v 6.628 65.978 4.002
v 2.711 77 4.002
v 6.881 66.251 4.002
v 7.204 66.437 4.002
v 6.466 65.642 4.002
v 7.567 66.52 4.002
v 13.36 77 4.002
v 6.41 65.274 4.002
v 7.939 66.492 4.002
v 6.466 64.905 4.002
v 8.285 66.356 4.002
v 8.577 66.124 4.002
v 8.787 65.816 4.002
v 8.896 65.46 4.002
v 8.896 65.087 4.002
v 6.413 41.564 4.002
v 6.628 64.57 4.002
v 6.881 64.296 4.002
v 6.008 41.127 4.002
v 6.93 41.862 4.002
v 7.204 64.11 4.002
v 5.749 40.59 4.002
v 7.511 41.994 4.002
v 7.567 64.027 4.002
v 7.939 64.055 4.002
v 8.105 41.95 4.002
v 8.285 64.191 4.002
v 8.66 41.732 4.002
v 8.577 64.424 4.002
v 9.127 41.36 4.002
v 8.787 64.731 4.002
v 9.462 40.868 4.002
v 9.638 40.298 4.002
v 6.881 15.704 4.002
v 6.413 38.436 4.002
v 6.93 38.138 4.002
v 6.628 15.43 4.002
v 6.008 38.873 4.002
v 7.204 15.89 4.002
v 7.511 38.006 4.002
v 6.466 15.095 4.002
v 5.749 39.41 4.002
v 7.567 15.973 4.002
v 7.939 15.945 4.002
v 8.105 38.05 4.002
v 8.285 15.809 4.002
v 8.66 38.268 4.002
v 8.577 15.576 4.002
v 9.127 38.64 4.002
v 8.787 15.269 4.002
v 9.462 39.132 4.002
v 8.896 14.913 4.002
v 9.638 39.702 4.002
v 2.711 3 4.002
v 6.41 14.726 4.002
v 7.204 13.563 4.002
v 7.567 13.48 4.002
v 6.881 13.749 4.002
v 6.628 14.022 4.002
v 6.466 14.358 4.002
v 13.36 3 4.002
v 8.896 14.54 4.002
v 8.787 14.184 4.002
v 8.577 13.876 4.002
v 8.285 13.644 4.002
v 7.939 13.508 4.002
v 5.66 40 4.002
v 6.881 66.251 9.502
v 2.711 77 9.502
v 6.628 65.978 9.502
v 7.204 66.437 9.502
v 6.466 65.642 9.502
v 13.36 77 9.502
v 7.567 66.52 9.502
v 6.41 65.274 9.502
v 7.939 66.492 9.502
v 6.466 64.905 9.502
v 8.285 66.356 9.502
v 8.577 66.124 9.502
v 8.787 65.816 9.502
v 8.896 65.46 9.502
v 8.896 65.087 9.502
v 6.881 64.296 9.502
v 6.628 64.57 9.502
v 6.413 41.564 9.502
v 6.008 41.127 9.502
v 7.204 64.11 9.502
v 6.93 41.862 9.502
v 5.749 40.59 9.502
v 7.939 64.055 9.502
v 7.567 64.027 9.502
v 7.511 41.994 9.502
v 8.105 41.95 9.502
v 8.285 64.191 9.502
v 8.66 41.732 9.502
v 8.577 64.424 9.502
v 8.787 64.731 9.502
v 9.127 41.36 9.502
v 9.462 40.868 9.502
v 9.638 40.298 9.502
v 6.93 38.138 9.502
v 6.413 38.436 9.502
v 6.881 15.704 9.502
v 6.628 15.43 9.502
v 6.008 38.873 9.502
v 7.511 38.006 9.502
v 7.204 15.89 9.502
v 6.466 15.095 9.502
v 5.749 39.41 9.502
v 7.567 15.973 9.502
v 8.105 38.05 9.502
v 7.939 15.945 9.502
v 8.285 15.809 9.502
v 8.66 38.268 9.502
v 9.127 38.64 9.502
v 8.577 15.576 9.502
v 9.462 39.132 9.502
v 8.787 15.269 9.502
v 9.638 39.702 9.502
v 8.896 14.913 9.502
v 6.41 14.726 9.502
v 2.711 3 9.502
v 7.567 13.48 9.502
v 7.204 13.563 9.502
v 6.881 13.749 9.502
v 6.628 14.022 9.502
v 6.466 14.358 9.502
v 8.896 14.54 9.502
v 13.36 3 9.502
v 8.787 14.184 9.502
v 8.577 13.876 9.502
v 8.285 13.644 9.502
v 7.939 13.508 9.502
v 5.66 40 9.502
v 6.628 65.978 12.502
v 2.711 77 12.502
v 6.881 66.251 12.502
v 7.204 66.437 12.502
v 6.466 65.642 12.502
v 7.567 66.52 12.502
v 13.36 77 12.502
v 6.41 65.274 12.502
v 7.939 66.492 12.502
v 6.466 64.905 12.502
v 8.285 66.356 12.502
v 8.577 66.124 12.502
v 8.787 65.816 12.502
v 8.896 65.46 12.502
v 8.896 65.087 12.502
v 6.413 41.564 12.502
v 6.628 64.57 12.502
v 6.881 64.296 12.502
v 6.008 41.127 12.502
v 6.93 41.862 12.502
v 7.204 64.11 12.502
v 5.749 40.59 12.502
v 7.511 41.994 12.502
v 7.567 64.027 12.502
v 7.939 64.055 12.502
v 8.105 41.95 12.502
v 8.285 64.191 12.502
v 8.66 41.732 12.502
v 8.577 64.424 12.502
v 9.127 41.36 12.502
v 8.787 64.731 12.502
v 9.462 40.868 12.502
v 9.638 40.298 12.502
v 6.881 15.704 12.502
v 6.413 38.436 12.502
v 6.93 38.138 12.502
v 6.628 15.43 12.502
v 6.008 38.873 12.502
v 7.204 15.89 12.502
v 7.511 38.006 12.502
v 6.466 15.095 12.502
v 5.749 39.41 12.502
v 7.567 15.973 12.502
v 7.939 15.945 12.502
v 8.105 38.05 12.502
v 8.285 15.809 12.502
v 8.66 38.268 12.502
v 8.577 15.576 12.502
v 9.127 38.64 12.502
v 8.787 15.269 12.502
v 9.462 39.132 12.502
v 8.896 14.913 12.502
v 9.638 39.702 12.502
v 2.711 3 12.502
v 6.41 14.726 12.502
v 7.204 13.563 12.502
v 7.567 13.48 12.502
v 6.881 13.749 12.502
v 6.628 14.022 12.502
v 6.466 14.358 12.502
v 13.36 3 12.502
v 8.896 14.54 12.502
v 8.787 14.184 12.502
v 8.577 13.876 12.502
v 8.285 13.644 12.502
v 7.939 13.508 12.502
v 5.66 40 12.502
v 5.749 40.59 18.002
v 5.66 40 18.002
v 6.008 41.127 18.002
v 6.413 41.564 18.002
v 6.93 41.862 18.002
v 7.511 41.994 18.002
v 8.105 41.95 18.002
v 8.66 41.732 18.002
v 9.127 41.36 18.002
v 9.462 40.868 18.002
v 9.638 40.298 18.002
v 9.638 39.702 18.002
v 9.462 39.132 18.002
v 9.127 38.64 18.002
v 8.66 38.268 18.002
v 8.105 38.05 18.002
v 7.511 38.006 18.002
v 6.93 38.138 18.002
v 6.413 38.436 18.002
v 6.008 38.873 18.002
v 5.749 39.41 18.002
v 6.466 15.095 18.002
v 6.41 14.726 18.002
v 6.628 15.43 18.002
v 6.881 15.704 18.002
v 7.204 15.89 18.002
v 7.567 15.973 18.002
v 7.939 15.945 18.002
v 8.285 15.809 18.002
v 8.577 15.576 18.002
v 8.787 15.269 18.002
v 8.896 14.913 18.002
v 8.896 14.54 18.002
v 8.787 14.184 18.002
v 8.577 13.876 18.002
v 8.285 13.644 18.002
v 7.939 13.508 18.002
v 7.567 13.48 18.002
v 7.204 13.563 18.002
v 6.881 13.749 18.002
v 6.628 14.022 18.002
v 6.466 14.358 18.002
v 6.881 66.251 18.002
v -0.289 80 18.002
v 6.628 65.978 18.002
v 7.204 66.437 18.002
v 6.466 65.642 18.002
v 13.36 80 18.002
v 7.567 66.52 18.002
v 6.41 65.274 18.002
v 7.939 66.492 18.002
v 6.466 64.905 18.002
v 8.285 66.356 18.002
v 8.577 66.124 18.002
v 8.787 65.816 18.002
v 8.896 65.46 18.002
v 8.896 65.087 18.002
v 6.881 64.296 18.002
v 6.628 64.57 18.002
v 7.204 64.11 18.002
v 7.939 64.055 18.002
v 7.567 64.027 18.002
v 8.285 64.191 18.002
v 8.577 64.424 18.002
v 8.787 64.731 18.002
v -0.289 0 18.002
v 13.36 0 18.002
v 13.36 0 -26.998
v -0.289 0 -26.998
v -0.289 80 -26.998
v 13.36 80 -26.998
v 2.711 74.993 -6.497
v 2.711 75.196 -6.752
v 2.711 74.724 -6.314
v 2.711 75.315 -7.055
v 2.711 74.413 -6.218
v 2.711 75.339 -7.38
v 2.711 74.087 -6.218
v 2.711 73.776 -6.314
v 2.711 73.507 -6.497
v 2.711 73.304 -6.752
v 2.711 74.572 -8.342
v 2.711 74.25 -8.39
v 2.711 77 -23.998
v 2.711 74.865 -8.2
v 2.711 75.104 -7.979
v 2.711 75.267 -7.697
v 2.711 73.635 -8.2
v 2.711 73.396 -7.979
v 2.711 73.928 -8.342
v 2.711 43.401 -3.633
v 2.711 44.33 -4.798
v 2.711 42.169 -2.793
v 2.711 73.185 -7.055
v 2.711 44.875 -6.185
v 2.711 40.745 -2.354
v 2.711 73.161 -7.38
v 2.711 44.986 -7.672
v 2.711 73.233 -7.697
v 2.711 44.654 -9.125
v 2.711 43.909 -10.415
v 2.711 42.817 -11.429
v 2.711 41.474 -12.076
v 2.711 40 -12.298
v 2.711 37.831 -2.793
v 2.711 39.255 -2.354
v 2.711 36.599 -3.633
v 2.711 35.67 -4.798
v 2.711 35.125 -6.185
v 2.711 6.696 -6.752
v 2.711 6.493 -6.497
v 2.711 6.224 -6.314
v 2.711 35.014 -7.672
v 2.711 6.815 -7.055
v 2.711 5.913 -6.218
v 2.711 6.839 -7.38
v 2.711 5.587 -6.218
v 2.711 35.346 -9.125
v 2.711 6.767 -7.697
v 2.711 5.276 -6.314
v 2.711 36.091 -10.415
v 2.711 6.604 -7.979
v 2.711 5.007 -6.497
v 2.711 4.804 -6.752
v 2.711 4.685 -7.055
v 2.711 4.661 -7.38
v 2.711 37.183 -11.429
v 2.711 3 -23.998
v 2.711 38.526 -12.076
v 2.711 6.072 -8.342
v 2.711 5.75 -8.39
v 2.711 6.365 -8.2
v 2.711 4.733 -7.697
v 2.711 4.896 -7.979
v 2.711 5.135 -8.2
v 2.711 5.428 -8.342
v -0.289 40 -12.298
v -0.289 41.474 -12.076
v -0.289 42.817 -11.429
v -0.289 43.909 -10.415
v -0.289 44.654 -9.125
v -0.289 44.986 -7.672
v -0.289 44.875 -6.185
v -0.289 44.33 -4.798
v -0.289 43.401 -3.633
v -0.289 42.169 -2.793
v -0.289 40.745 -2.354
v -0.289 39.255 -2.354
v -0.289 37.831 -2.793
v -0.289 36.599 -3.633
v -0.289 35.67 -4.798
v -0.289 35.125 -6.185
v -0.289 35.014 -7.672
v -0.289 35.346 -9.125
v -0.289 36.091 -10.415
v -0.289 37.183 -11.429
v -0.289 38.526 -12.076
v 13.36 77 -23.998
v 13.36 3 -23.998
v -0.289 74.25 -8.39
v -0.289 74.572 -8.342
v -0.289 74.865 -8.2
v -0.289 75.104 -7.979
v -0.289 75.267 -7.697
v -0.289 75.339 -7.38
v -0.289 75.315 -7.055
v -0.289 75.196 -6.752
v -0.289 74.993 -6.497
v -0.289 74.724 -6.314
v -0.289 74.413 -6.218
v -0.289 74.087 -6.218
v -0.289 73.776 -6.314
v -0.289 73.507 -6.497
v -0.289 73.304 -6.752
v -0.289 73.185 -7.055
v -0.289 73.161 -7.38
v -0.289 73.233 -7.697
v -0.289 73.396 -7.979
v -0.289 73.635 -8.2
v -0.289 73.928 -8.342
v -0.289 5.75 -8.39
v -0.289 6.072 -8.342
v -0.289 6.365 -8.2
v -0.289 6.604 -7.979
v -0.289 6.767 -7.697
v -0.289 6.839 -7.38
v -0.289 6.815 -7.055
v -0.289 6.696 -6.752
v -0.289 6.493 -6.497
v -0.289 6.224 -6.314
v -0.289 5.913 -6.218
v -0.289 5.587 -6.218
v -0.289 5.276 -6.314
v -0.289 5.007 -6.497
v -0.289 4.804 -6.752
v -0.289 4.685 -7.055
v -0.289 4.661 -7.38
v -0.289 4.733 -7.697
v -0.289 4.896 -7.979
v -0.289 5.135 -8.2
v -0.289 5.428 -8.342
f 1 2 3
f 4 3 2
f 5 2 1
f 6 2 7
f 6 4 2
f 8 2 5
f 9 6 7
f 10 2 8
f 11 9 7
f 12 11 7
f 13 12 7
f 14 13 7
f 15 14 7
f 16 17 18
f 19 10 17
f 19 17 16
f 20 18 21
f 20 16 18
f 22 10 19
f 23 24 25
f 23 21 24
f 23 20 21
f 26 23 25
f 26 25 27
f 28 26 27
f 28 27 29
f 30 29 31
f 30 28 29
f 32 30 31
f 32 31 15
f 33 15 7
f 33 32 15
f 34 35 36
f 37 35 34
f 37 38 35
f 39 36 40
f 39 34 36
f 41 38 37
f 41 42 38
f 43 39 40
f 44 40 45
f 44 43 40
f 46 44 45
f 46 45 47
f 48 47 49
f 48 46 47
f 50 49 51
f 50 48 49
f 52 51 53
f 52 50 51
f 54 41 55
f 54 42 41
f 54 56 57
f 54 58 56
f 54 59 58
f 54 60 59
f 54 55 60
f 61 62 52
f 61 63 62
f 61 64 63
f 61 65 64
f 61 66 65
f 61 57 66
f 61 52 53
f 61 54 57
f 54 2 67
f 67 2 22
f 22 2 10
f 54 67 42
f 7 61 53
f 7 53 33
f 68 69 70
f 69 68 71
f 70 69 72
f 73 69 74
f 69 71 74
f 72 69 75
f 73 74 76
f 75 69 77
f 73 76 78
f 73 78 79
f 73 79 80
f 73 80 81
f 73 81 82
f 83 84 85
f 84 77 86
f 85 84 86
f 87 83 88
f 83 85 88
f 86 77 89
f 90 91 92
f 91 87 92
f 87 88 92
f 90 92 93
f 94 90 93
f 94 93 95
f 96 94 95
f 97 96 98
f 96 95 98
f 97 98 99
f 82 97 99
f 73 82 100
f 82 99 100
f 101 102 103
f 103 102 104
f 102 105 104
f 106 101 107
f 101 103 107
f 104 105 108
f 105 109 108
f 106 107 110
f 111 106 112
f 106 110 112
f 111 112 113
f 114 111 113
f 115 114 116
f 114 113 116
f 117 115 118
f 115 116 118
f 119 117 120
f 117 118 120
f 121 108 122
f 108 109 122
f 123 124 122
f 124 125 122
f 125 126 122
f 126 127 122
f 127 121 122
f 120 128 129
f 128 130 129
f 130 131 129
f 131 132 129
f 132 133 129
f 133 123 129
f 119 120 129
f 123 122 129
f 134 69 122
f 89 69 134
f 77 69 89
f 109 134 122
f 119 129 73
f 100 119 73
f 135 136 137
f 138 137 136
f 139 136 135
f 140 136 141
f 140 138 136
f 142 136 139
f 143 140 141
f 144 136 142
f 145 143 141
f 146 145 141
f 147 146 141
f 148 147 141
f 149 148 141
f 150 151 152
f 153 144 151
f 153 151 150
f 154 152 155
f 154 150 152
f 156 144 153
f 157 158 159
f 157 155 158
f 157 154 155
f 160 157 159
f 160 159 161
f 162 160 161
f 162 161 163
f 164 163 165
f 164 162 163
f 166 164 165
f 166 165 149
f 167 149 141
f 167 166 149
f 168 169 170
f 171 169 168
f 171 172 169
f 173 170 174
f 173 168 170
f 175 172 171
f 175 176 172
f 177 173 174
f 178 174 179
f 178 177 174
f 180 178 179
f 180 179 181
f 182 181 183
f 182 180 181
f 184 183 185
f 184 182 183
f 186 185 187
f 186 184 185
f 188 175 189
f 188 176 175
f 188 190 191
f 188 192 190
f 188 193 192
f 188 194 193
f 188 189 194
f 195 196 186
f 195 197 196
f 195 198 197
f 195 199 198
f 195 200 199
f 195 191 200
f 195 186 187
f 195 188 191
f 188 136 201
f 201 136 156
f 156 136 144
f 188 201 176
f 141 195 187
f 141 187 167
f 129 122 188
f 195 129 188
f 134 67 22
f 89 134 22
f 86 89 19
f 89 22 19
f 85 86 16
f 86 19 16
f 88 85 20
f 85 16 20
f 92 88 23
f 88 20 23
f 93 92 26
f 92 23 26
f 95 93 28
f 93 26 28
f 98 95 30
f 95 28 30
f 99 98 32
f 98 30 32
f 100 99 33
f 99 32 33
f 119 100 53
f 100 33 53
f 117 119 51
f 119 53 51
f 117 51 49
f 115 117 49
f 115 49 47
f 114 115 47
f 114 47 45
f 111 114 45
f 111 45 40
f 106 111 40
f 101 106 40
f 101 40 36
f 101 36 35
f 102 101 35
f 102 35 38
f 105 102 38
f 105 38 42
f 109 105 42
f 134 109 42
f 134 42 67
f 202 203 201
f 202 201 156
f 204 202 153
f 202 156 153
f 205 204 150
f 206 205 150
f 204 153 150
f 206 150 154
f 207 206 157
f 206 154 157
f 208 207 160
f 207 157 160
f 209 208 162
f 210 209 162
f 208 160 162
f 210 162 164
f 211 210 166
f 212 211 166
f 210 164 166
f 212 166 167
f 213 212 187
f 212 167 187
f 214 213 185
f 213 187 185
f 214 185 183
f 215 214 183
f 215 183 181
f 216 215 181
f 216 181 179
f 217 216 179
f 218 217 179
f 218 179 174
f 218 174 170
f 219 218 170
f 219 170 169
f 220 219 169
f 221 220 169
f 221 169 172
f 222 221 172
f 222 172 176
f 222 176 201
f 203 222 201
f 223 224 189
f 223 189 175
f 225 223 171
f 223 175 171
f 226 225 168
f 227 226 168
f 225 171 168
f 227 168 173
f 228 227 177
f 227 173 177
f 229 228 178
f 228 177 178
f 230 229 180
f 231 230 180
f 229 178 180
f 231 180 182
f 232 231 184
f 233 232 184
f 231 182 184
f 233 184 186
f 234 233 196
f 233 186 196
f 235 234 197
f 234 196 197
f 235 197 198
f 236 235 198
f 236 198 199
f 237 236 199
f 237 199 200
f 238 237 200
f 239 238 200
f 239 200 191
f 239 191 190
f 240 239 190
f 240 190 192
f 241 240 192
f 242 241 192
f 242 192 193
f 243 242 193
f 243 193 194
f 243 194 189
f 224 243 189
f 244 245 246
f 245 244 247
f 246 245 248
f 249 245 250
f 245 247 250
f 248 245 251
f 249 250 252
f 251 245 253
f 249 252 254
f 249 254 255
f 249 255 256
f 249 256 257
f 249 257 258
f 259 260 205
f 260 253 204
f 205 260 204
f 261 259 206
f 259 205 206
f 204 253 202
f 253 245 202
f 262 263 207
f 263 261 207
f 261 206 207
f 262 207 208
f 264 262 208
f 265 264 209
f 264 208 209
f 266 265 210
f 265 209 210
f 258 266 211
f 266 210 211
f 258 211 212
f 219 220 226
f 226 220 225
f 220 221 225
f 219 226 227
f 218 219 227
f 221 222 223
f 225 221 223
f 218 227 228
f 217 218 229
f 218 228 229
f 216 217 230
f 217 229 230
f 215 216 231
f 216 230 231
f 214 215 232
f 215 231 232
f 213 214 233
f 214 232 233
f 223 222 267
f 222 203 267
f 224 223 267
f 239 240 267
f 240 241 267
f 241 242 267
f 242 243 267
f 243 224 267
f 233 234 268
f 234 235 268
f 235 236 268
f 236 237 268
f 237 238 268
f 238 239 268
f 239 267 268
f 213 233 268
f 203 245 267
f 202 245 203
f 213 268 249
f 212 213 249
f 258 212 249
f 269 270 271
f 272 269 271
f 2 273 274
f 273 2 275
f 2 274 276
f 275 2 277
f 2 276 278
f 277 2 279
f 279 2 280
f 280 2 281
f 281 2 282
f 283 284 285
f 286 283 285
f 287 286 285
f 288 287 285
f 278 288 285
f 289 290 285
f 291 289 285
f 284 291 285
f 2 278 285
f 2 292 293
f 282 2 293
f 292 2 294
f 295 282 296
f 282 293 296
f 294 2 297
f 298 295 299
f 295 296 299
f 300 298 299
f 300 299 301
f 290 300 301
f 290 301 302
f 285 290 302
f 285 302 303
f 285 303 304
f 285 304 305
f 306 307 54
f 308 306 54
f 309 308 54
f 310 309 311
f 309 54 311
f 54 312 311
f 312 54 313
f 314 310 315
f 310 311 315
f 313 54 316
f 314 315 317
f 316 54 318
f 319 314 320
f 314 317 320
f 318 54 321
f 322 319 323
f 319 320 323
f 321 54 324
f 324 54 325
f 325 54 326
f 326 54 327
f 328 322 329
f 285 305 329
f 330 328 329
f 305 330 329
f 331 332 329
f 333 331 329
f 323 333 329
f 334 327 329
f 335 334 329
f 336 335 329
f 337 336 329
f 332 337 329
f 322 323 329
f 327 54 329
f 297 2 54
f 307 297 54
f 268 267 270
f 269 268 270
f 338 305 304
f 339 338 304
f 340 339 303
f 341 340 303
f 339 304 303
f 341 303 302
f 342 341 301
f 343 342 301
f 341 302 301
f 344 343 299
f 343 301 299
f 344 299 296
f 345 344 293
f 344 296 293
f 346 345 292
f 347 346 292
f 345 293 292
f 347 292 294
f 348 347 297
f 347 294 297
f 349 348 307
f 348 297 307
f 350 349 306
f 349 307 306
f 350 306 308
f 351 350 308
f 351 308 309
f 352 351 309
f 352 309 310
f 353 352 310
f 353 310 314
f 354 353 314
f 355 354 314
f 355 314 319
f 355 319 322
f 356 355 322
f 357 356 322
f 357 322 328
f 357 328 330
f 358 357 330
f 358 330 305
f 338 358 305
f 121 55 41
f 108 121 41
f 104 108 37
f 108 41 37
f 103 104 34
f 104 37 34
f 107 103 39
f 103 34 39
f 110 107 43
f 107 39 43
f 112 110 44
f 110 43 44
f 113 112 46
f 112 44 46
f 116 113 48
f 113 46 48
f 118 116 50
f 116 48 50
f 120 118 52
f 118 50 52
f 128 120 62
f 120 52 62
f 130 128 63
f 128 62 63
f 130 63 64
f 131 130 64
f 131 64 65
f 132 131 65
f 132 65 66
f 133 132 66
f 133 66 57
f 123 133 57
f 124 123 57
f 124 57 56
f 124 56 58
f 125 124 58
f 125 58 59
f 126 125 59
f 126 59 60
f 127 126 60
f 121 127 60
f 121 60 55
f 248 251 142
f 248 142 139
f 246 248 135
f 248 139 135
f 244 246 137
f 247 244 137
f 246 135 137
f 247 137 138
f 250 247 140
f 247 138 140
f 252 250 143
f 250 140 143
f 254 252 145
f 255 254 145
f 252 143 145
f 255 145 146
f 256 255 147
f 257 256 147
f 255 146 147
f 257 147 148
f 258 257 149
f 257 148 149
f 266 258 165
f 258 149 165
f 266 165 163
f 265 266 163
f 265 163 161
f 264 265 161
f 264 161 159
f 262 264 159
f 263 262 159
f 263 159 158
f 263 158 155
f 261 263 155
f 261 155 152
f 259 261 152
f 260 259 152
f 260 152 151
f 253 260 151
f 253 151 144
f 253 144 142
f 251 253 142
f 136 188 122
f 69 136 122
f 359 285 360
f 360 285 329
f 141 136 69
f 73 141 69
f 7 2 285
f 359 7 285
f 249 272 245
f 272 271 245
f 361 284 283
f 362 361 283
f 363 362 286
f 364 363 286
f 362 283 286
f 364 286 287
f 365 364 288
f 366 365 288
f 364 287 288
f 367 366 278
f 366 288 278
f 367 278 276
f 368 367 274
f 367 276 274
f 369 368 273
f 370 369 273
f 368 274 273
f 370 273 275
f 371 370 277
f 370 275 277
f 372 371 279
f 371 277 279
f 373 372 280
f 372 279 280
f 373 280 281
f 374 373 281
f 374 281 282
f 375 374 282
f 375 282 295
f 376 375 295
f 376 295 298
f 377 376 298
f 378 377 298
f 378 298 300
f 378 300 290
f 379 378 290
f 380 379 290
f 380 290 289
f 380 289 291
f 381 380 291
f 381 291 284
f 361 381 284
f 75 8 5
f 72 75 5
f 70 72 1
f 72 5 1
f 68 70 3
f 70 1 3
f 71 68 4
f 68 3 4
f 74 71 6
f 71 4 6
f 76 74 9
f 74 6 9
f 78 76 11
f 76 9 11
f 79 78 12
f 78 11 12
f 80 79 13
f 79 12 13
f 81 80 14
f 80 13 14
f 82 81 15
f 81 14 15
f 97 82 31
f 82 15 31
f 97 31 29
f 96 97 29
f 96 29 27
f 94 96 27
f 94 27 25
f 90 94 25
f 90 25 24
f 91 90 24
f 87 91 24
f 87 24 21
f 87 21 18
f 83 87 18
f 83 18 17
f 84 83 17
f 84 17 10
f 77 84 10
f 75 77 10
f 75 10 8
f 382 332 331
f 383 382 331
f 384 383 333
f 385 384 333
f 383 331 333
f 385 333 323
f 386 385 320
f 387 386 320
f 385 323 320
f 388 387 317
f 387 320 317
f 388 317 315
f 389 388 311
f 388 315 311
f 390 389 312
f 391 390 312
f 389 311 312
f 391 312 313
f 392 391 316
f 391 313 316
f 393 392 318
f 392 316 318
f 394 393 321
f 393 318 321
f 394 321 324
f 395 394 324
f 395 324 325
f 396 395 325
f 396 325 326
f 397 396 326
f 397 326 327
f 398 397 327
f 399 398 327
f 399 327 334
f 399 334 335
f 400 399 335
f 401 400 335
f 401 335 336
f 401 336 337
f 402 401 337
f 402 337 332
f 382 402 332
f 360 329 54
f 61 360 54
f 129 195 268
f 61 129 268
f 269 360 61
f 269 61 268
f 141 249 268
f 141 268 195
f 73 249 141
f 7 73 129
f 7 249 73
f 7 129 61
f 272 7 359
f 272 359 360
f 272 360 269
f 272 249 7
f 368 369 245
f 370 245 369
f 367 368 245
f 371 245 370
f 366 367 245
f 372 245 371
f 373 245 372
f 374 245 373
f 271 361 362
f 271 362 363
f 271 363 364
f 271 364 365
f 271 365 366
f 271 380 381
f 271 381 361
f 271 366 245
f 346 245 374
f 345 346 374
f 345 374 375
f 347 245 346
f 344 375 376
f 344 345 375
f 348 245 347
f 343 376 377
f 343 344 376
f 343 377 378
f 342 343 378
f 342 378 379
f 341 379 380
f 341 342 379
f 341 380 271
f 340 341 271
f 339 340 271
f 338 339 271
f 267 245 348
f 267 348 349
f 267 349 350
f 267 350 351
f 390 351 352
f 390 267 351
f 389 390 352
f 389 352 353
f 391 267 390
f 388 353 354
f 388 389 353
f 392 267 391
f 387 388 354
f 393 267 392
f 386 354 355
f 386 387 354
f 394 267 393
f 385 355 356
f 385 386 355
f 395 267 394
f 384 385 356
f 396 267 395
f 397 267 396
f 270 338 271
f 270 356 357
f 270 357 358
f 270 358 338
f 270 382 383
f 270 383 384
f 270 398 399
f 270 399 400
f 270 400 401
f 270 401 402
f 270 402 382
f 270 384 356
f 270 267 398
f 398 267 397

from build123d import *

# Parameters (mm, degrees)
SKETCH1_W           = 10.6496793
SKETCH1_H           = 5.5
SKETCH1_W_2         = 3
SKETCH1_H_2         = 45
BOSS_EXTRUDE1_DEPTH = 80
SKETCH2_R           = 2
SKETCH2_R_2         = 1.25
CUT_EXTRUDE1_DEPTH  = 87.830296046
SKETCH3_R           = 5
SKETCH3_R_2         = 1.0922
CUT_EXTRUDE2_DEPTH  = 10
SKETCH4_W           = 28
SKETCH4_H           = 3
SKETCH4_W_2         = 8.5
BOSS_EXTRUDE2_DEPTH = 10.6496793


with BuildPart() as part:
    # Sketch1 → Boss-Extrude1 (new body)
    with BuildSketch(Plane(origin=(0, 0, 0), x_dir=(1, 0, 0), z_dir=(0, 1, 0))):
        with Locations((8.035561223, -6.751971663)):
            Rectangle(SKETCH1_W, SKETCH1_H)
        with Locations((1.210721573, 4.498028337)):
            Rectangle(SKETCH1_W_2, SKETCH1_H_2)
        with Locations((8.035561223, -15.251971663)):
            Rectangle(SKETCH1_W, SKETCH1_H)
    extrude(amount=BOSS_EXTRUDE1_DEPTH)

    # Sketch2 → Cut-Extrude1 (cut, through all)
    with BuildSketch(Plane(origin=(0, 0, 4.001971663), x_dir=(-1, 0, 0), z_dir=(0, 0, -1))):
        with Locations((-7.660400873, 40)):
            Circle(SKETCH2_R)
        with Locations((-7.660400873, 65.273758001)):
            Circle(SKETCH2_R_2)
        with Locations((-7.660400873, 14.726241999)):
            Circle(SKETCH2_R_2)
    extrude(amount=-CUT_EXTRUDE1_DEPTH, mode=Mode.SUBTRACT)

    # Sketch3 → Cut-Extrude2 (cut)
    with BuildSketch(Plane(origin=(2.710721573, 0, 0), x_dir=(0, 0, -1), z_dir=(1, 0, 0))):
        with Locations((7.298028337, 40)):
            Circle(SKETCH3_R)
        with Locations((7.298028337, 74.25)):
            Circle(SKETCH3_R_2)
        with Locations((7.298028337, 5.75)):
            Circle(SKETCH3_R_2)
    extrude(amount=-CUT_EXTRUDE2_DEPTH, mode=Mode.SUBTRACT)

    # Sketch4 → Boss-Extrude2 (add)
    with BuildSketch(Plane(origin=(2.710721573, 0, 0), x_dir=(0, 0, -1), z_dir=(1, 0, 0))):
        Polygon((26.998028337, 0), (26.998028337, 80), (23.998028337, 80), (23.998028337, 77), (23.998028337, 3), (23.998028337, 0), align=None)
        with Locations((9.998028337, 78.5)):
            Rectangle(SKETCH4_W, SKETCH4_H)
        with Locations((9.998028337, 1.5)):
            Rectangle(SKETCH4_W, SKETCH4_H)
        with Locations((-8.251971663, 78.5)):
            Rectangle(SKETCH4_W_2, SKETCH4_H)
        with Locations((-8.251971663, 1.5)):
            Rectangle(SKETCH4_W_2, SKETCH4_H)
    extrude(amount=BOSS_EXTRUDE2_DEPTH)


solid = part.part
